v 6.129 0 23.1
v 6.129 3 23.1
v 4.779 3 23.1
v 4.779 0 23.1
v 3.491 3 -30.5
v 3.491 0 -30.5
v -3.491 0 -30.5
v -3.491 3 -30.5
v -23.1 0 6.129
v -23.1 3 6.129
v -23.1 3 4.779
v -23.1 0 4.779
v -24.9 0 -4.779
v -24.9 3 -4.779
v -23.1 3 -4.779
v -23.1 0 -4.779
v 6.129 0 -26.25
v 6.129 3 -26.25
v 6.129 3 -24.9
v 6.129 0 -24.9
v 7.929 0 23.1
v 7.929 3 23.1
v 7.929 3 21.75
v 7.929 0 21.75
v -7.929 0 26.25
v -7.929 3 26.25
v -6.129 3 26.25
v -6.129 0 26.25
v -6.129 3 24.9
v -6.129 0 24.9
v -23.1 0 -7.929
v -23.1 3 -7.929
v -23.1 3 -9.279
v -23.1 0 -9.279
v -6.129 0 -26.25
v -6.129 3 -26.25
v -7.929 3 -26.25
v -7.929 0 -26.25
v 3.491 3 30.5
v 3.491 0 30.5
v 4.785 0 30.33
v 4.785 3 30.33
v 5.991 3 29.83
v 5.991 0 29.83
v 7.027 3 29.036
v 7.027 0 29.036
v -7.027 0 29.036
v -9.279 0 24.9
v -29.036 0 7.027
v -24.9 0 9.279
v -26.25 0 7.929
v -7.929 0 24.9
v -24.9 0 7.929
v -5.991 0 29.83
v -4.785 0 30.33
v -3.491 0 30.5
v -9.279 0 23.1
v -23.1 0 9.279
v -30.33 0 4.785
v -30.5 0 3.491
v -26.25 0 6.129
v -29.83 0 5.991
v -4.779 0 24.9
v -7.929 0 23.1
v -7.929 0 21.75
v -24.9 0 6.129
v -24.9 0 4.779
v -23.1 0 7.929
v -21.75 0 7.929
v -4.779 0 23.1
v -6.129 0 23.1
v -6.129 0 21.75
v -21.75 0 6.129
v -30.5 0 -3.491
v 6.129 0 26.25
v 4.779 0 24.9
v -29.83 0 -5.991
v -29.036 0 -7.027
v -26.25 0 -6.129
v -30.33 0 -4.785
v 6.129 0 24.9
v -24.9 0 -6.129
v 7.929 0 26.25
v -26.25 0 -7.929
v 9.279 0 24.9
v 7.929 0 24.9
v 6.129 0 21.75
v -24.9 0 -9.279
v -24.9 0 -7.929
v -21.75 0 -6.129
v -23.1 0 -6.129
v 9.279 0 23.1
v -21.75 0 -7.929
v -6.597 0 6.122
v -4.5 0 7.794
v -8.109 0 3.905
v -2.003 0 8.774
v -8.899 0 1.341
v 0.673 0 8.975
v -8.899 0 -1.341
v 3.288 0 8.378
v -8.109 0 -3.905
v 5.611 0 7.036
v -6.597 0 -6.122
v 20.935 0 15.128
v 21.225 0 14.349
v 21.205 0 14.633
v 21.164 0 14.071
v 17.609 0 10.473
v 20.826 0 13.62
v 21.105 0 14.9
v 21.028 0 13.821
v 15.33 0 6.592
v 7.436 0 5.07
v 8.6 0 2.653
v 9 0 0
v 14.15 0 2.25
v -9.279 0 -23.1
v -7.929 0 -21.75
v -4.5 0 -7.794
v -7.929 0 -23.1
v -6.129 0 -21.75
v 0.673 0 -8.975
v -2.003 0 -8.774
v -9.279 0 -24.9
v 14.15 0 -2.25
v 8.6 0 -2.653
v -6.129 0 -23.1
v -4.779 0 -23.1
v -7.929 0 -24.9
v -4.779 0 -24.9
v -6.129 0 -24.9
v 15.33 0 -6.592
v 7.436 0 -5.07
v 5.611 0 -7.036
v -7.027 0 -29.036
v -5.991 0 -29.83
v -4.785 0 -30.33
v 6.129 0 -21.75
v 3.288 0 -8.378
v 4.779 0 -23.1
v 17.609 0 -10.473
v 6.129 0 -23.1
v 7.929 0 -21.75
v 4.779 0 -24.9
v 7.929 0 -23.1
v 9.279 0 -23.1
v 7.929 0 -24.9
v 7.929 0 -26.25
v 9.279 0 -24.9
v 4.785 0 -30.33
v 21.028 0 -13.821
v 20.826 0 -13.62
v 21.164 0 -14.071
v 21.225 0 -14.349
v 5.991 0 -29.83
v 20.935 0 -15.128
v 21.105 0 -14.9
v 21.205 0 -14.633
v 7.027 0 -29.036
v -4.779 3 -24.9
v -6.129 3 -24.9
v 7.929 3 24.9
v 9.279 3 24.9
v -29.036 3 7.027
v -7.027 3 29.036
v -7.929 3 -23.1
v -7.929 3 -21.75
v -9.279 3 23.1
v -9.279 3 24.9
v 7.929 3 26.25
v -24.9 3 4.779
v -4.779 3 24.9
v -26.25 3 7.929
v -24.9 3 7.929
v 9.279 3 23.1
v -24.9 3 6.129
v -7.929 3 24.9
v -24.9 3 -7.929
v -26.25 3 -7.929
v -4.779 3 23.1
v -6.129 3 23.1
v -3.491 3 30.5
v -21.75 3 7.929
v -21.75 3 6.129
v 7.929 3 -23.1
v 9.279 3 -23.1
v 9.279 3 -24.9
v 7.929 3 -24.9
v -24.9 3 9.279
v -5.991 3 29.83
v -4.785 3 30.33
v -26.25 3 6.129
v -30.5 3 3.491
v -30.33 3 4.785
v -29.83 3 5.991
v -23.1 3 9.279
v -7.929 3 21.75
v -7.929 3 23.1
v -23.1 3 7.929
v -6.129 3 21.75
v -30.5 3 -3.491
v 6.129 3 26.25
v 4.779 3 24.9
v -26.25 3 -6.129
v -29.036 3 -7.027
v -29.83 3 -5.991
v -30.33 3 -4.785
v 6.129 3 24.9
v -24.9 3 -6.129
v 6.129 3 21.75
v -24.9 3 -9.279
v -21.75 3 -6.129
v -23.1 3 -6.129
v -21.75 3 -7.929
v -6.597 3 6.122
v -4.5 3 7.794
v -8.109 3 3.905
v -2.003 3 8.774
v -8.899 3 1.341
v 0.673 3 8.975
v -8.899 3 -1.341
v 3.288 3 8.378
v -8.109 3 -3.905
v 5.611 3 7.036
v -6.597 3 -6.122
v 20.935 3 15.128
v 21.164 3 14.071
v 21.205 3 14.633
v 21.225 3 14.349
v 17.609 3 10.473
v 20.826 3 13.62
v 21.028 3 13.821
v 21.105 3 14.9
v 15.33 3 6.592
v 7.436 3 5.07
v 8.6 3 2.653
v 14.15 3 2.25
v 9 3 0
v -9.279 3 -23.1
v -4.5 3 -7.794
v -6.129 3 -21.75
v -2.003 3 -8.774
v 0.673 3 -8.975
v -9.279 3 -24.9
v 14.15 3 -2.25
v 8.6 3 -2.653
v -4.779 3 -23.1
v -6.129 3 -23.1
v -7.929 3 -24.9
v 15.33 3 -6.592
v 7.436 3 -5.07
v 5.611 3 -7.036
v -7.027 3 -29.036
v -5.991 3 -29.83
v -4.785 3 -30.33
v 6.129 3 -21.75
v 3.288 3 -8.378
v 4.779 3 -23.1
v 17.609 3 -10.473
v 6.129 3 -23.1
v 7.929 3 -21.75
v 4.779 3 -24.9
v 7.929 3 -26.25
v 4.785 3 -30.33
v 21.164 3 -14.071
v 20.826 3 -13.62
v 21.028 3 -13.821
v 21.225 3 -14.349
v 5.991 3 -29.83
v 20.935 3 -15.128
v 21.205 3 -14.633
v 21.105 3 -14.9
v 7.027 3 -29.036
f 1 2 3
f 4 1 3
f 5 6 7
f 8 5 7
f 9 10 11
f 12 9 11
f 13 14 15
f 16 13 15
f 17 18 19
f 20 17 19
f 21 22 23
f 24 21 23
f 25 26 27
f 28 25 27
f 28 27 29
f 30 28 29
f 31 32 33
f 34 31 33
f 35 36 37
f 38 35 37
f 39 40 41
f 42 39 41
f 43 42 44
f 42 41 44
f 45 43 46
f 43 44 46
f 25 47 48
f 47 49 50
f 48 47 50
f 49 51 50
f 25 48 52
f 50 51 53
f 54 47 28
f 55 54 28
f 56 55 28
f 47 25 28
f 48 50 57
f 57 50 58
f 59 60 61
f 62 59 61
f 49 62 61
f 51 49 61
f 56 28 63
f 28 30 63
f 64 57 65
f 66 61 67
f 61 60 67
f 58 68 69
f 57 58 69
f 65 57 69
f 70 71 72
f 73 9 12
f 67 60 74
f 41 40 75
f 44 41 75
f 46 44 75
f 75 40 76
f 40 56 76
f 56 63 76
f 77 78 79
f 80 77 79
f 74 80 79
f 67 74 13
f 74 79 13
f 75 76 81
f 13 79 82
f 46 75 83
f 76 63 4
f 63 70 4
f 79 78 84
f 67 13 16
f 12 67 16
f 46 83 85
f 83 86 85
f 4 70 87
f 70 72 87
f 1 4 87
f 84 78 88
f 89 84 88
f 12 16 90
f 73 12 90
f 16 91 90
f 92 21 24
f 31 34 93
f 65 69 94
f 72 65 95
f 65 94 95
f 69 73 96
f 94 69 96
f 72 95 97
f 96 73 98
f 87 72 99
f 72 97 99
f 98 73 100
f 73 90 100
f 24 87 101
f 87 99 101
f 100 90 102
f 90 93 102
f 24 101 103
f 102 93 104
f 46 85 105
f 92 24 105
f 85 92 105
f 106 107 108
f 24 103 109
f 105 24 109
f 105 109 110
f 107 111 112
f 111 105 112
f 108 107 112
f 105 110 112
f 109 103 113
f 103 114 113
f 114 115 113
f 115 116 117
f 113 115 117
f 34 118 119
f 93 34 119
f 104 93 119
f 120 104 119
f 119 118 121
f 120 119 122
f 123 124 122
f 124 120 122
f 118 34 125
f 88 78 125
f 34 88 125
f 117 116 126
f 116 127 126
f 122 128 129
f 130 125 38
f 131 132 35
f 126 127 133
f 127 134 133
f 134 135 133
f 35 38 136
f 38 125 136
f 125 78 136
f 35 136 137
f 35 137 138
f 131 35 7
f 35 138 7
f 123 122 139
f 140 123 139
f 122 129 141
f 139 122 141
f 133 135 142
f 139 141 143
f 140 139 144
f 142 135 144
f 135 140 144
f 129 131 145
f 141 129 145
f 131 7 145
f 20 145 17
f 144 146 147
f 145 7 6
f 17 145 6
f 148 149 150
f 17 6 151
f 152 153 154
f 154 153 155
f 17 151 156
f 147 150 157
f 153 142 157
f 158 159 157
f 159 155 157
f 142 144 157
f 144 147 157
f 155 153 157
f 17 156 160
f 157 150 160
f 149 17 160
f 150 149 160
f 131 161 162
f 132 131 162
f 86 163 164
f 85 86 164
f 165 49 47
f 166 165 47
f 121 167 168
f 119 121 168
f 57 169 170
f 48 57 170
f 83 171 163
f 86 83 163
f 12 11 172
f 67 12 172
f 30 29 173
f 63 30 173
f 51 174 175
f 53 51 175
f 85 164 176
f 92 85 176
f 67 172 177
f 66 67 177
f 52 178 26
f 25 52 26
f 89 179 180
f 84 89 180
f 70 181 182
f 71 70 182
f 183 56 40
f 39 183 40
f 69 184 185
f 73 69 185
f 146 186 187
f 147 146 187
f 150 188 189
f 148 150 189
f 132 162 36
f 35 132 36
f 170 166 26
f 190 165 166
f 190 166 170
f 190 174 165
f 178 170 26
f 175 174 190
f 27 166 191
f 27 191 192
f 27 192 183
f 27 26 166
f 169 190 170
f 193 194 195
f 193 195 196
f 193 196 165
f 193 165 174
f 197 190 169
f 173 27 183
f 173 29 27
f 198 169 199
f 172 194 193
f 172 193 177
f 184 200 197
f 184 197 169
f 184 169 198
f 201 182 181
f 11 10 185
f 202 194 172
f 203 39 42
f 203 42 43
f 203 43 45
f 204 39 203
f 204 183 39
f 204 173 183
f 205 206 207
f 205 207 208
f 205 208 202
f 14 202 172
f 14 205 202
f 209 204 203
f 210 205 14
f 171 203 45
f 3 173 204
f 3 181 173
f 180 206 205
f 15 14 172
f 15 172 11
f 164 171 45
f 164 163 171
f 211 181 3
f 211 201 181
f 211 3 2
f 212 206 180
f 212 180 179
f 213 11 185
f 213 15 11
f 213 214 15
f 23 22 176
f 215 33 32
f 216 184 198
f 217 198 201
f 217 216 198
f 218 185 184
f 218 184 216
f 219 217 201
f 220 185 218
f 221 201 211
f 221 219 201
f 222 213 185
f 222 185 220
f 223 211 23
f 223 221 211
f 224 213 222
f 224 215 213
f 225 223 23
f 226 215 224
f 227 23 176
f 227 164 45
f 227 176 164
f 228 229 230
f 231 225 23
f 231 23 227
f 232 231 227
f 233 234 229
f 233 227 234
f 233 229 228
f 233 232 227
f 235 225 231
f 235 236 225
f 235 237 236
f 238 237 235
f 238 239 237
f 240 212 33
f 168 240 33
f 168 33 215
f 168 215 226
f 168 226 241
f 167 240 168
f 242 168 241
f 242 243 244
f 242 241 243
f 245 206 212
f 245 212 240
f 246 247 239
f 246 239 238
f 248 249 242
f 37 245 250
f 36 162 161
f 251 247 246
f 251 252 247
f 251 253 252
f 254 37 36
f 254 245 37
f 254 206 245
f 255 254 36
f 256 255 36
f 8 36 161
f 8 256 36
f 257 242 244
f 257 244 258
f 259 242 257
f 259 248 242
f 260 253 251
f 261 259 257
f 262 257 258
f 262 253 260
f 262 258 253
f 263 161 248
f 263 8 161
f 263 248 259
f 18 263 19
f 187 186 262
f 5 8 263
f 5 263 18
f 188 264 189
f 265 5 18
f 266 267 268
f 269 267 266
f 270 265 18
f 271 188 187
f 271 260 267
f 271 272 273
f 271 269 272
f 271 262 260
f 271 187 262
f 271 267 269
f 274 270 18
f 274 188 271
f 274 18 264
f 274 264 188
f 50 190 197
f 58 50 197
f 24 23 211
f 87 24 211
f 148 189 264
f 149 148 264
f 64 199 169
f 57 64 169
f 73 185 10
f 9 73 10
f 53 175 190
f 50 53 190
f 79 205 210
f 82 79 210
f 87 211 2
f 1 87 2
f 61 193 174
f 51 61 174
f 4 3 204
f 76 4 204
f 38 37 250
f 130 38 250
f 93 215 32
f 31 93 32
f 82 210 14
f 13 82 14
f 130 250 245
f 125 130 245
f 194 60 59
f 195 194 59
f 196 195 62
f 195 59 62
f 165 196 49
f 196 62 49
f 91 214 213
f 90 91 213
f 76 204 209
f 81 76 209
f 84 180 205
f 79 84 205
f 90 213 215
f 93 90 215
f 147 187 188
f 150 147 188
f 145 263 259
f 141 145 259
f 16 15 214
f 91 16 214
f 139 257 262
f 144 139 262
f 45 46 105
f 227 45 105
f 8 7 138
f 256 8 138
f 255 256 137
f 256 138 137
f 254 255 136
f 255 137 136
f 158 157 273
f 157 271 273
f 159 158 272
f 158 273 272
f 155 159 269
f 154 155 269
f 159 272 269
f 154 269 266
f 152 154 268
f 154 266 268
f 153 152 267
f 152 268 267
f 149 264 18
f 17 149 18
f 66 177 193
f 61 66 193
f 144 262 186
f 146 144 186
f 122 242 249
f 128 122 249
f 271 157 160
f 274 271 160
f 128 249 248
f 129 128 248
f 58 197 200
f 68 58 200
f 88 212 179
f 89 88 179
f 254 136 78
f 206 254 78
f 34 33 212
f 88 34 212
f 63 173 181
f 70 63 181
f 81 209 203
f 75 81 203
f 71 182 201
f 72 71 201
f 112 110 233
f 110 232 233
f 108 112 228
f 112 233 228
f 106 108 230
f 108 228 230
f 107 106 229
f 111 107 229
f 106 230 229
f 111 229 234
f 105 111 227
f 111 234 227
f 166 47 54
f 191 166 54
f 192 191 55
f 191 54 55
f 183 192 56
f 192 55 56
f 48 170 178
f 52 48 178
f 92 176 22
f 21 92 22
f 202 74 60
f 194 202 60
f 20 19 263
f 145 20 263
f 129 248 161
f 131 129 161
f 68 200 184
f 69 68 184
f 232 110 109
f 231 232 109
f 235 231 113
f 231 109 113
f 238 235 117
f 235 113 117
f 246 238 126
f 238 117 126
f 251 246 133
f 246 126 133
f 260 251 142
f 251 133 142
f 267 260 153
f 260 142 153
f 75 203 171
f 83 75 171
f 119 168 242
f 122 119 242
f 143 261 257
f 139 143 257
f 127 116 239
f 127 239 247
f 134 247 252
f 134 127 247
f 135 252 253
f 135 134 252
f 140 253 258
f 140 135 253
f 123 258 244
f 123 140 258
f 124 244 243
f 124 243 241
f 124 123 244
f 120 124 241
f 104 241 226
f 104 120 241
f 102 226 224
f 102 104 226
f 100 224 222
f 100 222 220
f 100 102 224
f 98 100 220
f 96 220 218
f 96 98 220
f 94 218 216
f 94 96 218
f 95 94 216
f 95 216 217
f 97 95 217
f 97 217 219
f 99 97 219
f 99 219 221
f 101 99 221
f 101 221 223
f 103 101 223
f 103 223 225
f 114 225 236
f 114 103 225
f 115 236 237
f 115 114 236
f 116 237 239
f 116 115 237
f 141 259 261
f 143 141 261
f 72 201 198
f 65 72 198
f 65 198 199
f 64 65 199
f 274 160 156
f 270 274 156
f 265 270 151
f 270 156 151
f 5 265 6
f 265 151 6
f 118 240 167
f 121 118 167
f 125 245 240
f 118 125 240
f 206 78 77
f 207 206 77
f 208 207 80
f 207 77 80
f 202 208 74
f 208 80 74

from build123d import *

# Parameters (mm, degrees)
SKETCH1_R           = 9
BOSS_EXTRUDE1_DEPTH = 3
CUT_EXTRUDE1_DEPTH  = 4
FILLET1_R           = 1


with BuildPart() as part:
    # Sketch1 → Boss-Extrude1 (new body)
    with BuildSketch(Plane(origin=(0, 0, 0), x_dir=(1, 0, 0), z_dir=(0, 1, 0))):
        with BuildLine():
            Line((3.491378029, 30.5), (-3.491378029, 30.5))
            ThreePointArc((-3.491378029, 30.5), (-5.40479519, 30.119397663), (-7.026911935, 29.035533906))
            Line((-7.026911935, 29.035533906), (-29.035533906, 7.026911935))
            ThreePointArc((-29.035533906, 7.026911935), (-30.119397663, 5.40479519), (-30.5, 3.491378029))
            Line((-30.5, 3.491378029), (-30.5, -3.491378029))
            ThreePointArc((-30.5, -3.491378029), (-30.119397663, -5.40479519), (-29.035533906, -7.026911935))
            Line((-29.035533906, -7.026911935), (-7.026911935, -29.035533906))
            ThreePointArc((-7.026911935, -29.035533906), (-5.40479519, -30.119397663), (-3.491378029, -30.5))
            Line((-3.491378029, -30.5), (3.491378029, -30.5))
            ThreePointArc((3.491378029, -30.5), (5.40479519, -30.119397663), (7.026911935, -29.035533906))
            Line((7.026911935, -29.035533906), (21.779928926, -14.282516914))
            ThreePointArc((21.779928926, -14.282516914), (14, 0), (21.779928926, 14.282516914))
            Line((21.779928926, 14.282516914), (7.026911935, 29.035533906))
            ThreePointArc((7.026911935, 29.035533906), (5.40479519, 30.119397663), (3.491378029, 30.5))
        make_face()
        Circle(SKETCH1_R, mode=Mode.SUBTRACT)
    extrude(amount=BOSS_EXTRUDE1_DEPTH)

    # Sketch4 → Cut-Extrude1 (cut, through all)
    with BuildSketch(Plane(origin=(0, 3, 0), x_dir=(1, 0, 0), z_dir=(0, 1, 0))):
        Polygon((-26.25, 7.929437252), (-26.25, 6.129437252), (-24.9, 6.129437252), (-24.9, 4.779437252), (-23.1, 4.779437252), (-23.1, 6.129437252), (-21.75, 6.129437252), (-21.75, 7.929437252), (-23.1, 7.929437252), (-23.1, 9.279437252), (-24.9, 9.279437252), (-24.9, 7.929437252), align=None)
        Polygon((-23.1, -4.779437252), (-24.9, -4.779437252), (-24.9, -6.129437252), (-26.25, -6.129437252), (-26.25, -7.929437252), (-24.9, -7.929437252), (-24.9, -9.279437252), (-23.1, -9.279437252), (-23.1, -7.929437252), (-21.75, -7.929437252), (-21.75, -6.129437252), (-23.1, -6.129437252), align=None)
        Polygon((7.929437252, 23.1), (9.279437252, 23.1), (9.279437252, 24.9), (7.929437252, 24.9), (7.929437252, 26.25), (6.129437252, 26.25), (6.129437252, 24.9), (4.779437252, 24.9), (4.779437252, 23.1), (6.129437252, 23.1), (6.129437252, 21.75), (7.929437252, 21.75), align=None)
        Polygon((26.25, -7.929437252), (26.25, -6.129437252), (24.9, -6.129437252), (24.9, -4.779437252), (23.1, -4.779437252), (23.1, -6.129437252), (21.75, -6.129437252), (21.75, -7.929437252), (23.1, -7.929437252), (23.1, -9.279437252), (24.9, -9.279437252), (24.9, -7.929437252), align=None)
        Polygon((-4.779437252, 24.9), (-6.129437252, 24.9), (-6.129437252, 26.25), (-7.929437252, 26.25), (-7.929437252, 24.9), (-9.279437252, 24.9), (-9.279437252, 23.1), (-7.929437252, 23.1), (-7.929437252, 21.75), (-6.129437252, 21.75), (-6.129437252, 23.1), (-4.779437252, 23.1), align=None)
        Polygon((26.25, 7.929437252), (24.9, 7.929437252), (24.9, 9.279437252), (23.1, 9.279437252), (23.1, 7.929437252), (21.75, 7.929437252), (21.75, 6.129437252), (23.1, 6.129437252), (23.1, 4.779437252), (24.9, 4.779437252), (24.9, 6.129437252), (26.25, 6.129437252), align=None)
        Polygon((-6.129437252, -26.25), (-6.129437252, -24.9), (-4.779437252, -24.9), (-4.779437252, -23.1), (-6.129437252, -23.1), (-6.129437252, -21.75), (-7.929437252, -21.75), (-7.929437252, -23.1), (-9.279437252, -23.1), (-9.279437252, -24.9), (-7.929437252, -24.9), (-7.929437252, -26.25), align=None)
        Polygon((7.929437252, -26.25), (7.929437252, -24.9), (9.279437252, -24.9), (9.279437252, -23.1), (7.929437252, -23.1), (7.929437252, -21.75), (6.129437252, -21.75), (6.129437252, -23.1), (4.779437252, -23.1), (4.779437252, -24.9), (6.129437252, -24.9), (6.129437252, -26.25), align=None)
    extrude(amount=-CUT_EXTRUDE1_DEPTH, mode=Mode.SUBTRACT)

    # Fillet1
    fillet1_edges = [part.edges().sort_by_distance(p)[0] for p in [
        (21.779928926, 1.5, -14.282516914),
        (21.779928926, 1.5, 14.282516914),
    ]]
    fillet(fillet1_edges, radius=FILLET1_R)


solid = part.part
